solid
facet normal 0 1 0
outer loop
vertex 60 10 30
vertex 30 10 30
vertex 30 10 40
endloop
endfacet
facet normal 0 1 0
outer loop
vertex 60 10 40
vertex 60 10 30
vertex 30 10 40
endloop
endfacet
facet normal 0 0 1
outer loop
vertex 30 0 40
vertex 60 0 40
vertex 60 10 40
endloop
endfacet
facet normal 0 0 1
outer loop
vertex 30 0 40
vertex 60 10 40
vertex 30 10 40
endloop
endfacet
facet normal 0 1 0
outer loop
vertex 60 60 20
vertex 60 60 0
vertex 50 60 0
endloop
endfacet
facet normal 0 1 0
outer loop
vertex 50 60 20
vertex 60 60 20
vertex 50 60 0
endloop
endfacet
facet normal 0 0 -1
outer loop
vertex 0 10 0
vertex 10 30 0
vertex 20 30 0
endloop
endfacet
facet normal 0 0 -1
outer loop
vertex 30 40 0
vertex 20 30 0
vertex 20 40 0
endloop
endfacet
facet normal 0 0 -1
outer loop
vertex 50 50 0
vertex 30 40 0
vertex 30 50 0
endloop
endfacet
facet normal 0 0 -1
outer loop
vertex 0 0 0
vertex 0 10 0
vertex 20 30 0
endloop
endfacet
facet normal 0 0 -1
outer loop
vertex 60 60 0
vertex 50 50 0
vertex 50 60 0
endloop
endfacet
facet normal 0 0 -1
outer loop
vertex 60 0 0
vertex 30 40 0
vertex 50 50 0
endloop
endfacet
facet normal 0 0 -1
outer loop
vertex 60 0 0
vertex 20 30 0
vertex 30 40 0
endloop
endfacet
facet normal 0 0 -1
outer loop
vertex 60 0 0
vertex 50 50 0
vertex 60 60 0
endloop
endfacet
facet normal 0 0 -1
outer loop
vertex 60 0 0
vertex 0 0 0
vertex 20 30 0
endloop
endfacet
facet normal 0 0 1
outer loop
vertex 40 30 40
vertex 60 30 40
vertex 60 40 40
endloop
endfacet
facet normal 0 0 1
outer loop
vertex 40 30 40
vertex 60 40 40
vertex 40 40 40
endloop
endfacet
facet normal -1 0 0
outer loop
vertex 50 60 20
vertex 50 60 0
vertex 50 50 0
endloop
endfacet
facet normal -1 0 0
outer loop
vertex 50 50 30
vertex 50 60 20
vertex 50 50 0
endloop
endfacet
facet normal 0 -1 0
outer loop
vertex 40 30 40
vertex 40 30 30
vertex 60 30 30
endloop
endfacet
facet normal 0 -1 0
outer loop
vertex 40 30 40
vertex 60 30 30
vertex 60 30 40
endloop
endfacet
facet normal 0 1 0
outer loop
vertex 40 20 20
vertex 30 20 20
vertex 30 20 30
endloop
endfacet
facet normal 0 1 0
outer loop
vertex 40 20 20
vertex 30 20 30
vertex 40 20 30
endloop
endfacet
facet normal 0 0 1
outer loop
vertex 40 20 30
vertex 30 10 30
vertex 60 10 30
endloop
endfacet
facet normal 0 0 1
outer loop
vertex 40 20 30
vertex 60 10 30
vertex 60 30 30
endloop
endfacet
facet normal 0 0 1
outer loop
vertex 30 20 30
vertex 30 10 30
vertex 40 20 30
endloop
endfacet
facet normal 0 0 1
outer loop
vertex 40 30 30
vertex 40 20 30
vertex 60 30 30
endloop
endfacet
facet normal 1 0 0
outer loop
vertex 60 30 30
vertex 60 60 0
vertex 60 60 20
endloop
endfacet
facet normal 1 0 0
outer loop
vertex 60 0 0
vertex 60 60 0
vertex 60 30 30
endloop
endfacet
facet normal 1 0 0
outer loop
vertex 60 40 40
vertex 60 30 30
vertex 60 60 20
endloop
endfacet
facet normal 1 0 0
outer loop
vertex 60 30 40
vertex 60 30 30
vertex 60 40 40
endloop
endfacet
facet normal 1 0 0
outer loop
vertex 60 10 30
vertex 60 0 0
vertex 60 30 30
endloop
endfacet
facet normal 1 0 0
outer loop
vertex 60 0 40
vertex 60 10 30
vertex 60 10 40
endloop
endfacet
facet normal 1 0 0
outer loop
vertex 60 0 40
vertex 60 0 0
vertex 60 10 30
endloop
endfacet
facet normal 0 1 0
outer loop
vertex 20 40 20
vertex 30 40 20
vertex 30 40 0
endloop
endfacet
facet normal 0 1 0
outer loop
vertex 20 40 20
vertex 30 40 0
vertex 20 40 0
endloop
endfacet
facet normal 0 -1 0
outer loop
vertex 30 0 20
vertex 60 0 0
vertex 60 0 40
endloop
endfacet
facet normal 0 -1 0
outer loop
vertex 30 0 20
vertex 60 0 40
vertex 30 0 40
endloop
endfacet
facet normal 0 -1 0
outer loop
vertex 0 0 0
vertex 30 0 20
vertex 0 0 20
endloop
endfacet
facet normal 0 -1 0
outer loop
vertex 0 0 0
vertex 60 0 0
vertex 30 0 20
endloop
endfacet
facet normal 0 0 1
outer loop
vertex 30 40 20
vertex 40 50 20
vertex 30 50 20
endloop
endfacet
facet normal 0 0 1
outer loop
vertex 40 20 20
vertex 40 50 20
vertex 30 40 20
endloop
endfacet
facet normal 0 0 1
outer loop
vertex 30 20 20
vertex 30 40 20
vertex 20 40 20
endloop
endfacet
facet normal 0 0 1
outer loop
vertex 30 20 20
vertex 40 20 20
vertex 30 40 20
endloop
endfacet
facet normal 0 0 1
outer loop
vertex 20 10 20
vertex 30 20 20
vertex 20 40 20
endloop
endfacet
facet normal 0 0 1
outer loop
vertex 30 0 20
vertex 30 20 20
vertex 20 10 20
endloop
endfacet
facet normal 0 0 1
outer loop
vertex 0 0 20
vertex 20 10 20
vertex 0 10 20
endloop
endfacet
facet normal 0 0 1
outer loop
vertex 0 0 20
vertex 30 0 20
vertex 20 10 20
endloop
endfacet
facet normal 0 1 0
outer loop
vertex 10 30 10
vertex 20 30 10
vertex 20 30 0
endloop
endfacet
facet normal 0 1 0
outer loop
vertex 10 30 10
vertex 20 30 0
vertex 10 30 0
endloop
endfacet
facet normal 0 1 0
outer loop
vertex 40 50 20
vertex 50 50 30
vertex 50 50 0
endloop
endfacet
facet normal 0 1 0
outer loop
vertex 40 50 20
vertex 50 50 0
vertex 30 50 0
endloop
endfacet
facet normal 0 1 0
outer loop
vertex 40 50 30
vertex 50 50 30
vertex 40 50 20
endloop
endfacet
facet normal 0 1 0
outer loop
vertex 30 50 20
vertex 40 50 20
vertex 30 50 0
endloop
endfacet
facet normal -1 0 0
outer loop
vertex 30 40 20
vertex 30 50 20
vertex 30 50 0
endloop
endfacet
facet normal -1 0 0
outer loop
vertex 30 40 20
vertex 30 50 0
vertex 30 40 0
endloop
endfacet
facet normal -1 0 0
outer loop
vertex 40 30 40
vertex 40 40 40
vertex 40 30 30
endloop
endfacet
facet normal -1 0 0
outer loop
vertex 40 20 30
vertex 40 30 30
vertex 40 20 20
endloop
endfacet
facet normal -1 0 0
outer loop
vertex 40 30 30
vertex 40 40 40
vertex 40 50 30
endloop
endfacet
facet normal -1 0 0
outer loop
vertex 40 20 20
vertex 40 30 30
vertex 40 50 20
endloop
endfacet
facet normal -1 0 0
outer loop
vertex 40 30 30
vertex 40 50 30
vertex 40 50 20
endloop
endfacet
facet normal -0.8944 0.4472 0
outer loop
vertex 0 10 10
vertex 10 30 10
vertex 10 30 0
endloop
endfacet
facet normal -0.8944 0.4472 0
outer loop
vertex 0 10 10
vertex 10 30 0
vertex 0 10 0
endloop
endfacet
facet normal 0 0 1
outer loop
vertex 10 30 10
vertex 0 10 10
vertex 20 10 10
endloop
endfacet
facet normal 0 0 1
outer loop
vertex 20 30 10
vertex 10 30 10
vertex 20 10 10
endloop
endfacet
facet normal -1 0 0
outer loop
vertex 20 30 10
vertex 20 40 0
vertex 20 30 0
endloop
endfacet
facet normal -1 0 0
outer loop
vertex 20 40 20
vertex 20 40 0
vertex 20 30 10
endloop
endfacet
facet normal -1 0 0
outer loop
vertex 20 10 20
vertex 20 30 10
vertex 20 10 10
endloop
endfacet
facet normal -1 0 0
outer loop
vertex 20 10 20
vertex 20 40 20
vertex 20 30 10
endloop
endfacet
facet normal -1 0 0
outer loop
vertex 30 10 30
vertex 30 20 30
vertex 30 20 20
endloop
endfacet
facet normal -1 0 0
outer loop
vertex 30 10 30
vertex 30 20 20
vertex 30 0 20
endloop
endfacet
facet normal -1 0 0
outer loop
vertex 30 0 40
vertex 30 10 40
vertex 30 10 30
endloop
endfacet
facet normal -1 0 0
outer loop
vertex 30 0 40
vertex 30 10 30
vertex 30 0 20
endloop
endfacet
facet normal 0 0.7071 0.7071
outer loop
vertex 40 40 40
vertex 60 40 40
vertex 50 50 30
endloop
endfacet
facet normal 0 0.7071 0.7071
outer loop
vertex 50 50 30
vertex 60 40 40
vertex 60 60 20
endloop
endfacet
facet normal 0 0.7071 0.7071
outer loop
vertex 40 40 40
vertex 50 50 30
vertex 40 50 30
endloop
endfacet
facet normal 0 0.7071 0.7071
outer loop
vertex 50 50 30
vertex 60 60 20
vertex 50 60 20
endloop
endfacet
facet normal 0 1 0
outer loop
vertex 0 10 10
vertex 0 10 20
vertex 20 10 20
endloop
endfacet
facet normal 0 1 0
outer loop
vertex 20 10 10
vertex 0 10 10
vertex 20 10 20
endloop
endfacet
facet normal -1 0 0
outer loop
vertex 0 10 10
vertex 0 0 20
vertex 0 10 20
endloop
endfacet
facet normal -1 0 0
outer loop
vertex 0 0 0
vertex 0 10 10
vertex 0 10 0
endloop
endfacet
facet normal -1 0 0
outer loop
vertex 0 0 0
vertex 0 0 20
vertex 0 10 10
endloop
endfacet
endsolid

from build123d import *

# Parameters (mm, degrees)
BOSS_EXTRUDE1_DEPTH = 60
CUT_EXTRUDE1_DEPTH  = 41
SKETCH3_W           = 20
SKETCH3_H           = 20
CUT_EXTRUDE2_DEPTH  = 10
CHAMFER1_SIZE       = 20
SKETCH4_W           = 10
SKETCH4_H           = 20
CUT_EXTRUDE3_DEPTH  = 30
SKETCH5_W           = 10
SKETCH5_H           = 20
CUT_EXTRUDE4_DEPTH  = 30


with BuildPart() as part:
    # Sketch1 → Boss-Extrude1 (new body)
    with BuildSketch(Plane(origin=(0, 0, 0), x_dir=(1, 0, 0), z_dir=(0, 1, 0))):
        Polygon((0, 0), (60, 0), (60, -40), (30, -40), (30, -20), (0, -20), align=None)
    extrude(amount=BOSS_EXTRUDE1_DEPTH)

    # Sketch2 → Cut-Extrude1 (cut, through all)
    with BuildSketch(Plane.XY.offset(40)):
        Polygon((50, 60), (50, 50), (30, 50), (30, 40), (20, 40), (20, 30), (10, 30), (0, 10), (0, 60), align=None)
    extrude(amount=-CUT_EXTRUDE1_DEPTH, mode=Mode.SUBTRACT)

    # Sketch3 → Cut-Extrude2 (cut)
    with BuildSketch(Plane.XY.offset(20)):
        with Locations((10, 20)):
            Rectangle(SKETCH3_W, SKETCH3_H)
    extrude(amount=-CUT_EXTRUDE2_DEPTH, mode=Mode.SUBTRACT)

    # Chamfer1
    chamfer1_edges = [part.edges().sort_by_distance(p)[0] for p in [
        (55, 60, 40),
    ]]
    chamfer(chamfer1_edges, length=CHAMFER1_SIZE)

    # Sketch4 → Cut-Extrude3 (cut)
    with BuildSketch(Plane(origin=(0, 50, 0), x_dir=(1, 0, 0), z_dir=(0, 1, 0))):
        with Locations((35, -30)):
            Rectangle(SKETCH4_W, SKETCH4_H)
    extrude(amount=-CUT_EXTRUDE3_DEPTH, mode=Mode.SUBTRACT)

    # Sketch5 → Cut-Extrude4 (cut)
    with BuildSketch(Plane.ZY.offset(-30)):
        with Locations((35, 20)):
            Rectangle(SKETCH5_W, SKETCH5_H)
    extrude(amount=-CUT_EXTRUDE4_DEPTH, mode=Mode.SUBTRACT)


solid = part.part
